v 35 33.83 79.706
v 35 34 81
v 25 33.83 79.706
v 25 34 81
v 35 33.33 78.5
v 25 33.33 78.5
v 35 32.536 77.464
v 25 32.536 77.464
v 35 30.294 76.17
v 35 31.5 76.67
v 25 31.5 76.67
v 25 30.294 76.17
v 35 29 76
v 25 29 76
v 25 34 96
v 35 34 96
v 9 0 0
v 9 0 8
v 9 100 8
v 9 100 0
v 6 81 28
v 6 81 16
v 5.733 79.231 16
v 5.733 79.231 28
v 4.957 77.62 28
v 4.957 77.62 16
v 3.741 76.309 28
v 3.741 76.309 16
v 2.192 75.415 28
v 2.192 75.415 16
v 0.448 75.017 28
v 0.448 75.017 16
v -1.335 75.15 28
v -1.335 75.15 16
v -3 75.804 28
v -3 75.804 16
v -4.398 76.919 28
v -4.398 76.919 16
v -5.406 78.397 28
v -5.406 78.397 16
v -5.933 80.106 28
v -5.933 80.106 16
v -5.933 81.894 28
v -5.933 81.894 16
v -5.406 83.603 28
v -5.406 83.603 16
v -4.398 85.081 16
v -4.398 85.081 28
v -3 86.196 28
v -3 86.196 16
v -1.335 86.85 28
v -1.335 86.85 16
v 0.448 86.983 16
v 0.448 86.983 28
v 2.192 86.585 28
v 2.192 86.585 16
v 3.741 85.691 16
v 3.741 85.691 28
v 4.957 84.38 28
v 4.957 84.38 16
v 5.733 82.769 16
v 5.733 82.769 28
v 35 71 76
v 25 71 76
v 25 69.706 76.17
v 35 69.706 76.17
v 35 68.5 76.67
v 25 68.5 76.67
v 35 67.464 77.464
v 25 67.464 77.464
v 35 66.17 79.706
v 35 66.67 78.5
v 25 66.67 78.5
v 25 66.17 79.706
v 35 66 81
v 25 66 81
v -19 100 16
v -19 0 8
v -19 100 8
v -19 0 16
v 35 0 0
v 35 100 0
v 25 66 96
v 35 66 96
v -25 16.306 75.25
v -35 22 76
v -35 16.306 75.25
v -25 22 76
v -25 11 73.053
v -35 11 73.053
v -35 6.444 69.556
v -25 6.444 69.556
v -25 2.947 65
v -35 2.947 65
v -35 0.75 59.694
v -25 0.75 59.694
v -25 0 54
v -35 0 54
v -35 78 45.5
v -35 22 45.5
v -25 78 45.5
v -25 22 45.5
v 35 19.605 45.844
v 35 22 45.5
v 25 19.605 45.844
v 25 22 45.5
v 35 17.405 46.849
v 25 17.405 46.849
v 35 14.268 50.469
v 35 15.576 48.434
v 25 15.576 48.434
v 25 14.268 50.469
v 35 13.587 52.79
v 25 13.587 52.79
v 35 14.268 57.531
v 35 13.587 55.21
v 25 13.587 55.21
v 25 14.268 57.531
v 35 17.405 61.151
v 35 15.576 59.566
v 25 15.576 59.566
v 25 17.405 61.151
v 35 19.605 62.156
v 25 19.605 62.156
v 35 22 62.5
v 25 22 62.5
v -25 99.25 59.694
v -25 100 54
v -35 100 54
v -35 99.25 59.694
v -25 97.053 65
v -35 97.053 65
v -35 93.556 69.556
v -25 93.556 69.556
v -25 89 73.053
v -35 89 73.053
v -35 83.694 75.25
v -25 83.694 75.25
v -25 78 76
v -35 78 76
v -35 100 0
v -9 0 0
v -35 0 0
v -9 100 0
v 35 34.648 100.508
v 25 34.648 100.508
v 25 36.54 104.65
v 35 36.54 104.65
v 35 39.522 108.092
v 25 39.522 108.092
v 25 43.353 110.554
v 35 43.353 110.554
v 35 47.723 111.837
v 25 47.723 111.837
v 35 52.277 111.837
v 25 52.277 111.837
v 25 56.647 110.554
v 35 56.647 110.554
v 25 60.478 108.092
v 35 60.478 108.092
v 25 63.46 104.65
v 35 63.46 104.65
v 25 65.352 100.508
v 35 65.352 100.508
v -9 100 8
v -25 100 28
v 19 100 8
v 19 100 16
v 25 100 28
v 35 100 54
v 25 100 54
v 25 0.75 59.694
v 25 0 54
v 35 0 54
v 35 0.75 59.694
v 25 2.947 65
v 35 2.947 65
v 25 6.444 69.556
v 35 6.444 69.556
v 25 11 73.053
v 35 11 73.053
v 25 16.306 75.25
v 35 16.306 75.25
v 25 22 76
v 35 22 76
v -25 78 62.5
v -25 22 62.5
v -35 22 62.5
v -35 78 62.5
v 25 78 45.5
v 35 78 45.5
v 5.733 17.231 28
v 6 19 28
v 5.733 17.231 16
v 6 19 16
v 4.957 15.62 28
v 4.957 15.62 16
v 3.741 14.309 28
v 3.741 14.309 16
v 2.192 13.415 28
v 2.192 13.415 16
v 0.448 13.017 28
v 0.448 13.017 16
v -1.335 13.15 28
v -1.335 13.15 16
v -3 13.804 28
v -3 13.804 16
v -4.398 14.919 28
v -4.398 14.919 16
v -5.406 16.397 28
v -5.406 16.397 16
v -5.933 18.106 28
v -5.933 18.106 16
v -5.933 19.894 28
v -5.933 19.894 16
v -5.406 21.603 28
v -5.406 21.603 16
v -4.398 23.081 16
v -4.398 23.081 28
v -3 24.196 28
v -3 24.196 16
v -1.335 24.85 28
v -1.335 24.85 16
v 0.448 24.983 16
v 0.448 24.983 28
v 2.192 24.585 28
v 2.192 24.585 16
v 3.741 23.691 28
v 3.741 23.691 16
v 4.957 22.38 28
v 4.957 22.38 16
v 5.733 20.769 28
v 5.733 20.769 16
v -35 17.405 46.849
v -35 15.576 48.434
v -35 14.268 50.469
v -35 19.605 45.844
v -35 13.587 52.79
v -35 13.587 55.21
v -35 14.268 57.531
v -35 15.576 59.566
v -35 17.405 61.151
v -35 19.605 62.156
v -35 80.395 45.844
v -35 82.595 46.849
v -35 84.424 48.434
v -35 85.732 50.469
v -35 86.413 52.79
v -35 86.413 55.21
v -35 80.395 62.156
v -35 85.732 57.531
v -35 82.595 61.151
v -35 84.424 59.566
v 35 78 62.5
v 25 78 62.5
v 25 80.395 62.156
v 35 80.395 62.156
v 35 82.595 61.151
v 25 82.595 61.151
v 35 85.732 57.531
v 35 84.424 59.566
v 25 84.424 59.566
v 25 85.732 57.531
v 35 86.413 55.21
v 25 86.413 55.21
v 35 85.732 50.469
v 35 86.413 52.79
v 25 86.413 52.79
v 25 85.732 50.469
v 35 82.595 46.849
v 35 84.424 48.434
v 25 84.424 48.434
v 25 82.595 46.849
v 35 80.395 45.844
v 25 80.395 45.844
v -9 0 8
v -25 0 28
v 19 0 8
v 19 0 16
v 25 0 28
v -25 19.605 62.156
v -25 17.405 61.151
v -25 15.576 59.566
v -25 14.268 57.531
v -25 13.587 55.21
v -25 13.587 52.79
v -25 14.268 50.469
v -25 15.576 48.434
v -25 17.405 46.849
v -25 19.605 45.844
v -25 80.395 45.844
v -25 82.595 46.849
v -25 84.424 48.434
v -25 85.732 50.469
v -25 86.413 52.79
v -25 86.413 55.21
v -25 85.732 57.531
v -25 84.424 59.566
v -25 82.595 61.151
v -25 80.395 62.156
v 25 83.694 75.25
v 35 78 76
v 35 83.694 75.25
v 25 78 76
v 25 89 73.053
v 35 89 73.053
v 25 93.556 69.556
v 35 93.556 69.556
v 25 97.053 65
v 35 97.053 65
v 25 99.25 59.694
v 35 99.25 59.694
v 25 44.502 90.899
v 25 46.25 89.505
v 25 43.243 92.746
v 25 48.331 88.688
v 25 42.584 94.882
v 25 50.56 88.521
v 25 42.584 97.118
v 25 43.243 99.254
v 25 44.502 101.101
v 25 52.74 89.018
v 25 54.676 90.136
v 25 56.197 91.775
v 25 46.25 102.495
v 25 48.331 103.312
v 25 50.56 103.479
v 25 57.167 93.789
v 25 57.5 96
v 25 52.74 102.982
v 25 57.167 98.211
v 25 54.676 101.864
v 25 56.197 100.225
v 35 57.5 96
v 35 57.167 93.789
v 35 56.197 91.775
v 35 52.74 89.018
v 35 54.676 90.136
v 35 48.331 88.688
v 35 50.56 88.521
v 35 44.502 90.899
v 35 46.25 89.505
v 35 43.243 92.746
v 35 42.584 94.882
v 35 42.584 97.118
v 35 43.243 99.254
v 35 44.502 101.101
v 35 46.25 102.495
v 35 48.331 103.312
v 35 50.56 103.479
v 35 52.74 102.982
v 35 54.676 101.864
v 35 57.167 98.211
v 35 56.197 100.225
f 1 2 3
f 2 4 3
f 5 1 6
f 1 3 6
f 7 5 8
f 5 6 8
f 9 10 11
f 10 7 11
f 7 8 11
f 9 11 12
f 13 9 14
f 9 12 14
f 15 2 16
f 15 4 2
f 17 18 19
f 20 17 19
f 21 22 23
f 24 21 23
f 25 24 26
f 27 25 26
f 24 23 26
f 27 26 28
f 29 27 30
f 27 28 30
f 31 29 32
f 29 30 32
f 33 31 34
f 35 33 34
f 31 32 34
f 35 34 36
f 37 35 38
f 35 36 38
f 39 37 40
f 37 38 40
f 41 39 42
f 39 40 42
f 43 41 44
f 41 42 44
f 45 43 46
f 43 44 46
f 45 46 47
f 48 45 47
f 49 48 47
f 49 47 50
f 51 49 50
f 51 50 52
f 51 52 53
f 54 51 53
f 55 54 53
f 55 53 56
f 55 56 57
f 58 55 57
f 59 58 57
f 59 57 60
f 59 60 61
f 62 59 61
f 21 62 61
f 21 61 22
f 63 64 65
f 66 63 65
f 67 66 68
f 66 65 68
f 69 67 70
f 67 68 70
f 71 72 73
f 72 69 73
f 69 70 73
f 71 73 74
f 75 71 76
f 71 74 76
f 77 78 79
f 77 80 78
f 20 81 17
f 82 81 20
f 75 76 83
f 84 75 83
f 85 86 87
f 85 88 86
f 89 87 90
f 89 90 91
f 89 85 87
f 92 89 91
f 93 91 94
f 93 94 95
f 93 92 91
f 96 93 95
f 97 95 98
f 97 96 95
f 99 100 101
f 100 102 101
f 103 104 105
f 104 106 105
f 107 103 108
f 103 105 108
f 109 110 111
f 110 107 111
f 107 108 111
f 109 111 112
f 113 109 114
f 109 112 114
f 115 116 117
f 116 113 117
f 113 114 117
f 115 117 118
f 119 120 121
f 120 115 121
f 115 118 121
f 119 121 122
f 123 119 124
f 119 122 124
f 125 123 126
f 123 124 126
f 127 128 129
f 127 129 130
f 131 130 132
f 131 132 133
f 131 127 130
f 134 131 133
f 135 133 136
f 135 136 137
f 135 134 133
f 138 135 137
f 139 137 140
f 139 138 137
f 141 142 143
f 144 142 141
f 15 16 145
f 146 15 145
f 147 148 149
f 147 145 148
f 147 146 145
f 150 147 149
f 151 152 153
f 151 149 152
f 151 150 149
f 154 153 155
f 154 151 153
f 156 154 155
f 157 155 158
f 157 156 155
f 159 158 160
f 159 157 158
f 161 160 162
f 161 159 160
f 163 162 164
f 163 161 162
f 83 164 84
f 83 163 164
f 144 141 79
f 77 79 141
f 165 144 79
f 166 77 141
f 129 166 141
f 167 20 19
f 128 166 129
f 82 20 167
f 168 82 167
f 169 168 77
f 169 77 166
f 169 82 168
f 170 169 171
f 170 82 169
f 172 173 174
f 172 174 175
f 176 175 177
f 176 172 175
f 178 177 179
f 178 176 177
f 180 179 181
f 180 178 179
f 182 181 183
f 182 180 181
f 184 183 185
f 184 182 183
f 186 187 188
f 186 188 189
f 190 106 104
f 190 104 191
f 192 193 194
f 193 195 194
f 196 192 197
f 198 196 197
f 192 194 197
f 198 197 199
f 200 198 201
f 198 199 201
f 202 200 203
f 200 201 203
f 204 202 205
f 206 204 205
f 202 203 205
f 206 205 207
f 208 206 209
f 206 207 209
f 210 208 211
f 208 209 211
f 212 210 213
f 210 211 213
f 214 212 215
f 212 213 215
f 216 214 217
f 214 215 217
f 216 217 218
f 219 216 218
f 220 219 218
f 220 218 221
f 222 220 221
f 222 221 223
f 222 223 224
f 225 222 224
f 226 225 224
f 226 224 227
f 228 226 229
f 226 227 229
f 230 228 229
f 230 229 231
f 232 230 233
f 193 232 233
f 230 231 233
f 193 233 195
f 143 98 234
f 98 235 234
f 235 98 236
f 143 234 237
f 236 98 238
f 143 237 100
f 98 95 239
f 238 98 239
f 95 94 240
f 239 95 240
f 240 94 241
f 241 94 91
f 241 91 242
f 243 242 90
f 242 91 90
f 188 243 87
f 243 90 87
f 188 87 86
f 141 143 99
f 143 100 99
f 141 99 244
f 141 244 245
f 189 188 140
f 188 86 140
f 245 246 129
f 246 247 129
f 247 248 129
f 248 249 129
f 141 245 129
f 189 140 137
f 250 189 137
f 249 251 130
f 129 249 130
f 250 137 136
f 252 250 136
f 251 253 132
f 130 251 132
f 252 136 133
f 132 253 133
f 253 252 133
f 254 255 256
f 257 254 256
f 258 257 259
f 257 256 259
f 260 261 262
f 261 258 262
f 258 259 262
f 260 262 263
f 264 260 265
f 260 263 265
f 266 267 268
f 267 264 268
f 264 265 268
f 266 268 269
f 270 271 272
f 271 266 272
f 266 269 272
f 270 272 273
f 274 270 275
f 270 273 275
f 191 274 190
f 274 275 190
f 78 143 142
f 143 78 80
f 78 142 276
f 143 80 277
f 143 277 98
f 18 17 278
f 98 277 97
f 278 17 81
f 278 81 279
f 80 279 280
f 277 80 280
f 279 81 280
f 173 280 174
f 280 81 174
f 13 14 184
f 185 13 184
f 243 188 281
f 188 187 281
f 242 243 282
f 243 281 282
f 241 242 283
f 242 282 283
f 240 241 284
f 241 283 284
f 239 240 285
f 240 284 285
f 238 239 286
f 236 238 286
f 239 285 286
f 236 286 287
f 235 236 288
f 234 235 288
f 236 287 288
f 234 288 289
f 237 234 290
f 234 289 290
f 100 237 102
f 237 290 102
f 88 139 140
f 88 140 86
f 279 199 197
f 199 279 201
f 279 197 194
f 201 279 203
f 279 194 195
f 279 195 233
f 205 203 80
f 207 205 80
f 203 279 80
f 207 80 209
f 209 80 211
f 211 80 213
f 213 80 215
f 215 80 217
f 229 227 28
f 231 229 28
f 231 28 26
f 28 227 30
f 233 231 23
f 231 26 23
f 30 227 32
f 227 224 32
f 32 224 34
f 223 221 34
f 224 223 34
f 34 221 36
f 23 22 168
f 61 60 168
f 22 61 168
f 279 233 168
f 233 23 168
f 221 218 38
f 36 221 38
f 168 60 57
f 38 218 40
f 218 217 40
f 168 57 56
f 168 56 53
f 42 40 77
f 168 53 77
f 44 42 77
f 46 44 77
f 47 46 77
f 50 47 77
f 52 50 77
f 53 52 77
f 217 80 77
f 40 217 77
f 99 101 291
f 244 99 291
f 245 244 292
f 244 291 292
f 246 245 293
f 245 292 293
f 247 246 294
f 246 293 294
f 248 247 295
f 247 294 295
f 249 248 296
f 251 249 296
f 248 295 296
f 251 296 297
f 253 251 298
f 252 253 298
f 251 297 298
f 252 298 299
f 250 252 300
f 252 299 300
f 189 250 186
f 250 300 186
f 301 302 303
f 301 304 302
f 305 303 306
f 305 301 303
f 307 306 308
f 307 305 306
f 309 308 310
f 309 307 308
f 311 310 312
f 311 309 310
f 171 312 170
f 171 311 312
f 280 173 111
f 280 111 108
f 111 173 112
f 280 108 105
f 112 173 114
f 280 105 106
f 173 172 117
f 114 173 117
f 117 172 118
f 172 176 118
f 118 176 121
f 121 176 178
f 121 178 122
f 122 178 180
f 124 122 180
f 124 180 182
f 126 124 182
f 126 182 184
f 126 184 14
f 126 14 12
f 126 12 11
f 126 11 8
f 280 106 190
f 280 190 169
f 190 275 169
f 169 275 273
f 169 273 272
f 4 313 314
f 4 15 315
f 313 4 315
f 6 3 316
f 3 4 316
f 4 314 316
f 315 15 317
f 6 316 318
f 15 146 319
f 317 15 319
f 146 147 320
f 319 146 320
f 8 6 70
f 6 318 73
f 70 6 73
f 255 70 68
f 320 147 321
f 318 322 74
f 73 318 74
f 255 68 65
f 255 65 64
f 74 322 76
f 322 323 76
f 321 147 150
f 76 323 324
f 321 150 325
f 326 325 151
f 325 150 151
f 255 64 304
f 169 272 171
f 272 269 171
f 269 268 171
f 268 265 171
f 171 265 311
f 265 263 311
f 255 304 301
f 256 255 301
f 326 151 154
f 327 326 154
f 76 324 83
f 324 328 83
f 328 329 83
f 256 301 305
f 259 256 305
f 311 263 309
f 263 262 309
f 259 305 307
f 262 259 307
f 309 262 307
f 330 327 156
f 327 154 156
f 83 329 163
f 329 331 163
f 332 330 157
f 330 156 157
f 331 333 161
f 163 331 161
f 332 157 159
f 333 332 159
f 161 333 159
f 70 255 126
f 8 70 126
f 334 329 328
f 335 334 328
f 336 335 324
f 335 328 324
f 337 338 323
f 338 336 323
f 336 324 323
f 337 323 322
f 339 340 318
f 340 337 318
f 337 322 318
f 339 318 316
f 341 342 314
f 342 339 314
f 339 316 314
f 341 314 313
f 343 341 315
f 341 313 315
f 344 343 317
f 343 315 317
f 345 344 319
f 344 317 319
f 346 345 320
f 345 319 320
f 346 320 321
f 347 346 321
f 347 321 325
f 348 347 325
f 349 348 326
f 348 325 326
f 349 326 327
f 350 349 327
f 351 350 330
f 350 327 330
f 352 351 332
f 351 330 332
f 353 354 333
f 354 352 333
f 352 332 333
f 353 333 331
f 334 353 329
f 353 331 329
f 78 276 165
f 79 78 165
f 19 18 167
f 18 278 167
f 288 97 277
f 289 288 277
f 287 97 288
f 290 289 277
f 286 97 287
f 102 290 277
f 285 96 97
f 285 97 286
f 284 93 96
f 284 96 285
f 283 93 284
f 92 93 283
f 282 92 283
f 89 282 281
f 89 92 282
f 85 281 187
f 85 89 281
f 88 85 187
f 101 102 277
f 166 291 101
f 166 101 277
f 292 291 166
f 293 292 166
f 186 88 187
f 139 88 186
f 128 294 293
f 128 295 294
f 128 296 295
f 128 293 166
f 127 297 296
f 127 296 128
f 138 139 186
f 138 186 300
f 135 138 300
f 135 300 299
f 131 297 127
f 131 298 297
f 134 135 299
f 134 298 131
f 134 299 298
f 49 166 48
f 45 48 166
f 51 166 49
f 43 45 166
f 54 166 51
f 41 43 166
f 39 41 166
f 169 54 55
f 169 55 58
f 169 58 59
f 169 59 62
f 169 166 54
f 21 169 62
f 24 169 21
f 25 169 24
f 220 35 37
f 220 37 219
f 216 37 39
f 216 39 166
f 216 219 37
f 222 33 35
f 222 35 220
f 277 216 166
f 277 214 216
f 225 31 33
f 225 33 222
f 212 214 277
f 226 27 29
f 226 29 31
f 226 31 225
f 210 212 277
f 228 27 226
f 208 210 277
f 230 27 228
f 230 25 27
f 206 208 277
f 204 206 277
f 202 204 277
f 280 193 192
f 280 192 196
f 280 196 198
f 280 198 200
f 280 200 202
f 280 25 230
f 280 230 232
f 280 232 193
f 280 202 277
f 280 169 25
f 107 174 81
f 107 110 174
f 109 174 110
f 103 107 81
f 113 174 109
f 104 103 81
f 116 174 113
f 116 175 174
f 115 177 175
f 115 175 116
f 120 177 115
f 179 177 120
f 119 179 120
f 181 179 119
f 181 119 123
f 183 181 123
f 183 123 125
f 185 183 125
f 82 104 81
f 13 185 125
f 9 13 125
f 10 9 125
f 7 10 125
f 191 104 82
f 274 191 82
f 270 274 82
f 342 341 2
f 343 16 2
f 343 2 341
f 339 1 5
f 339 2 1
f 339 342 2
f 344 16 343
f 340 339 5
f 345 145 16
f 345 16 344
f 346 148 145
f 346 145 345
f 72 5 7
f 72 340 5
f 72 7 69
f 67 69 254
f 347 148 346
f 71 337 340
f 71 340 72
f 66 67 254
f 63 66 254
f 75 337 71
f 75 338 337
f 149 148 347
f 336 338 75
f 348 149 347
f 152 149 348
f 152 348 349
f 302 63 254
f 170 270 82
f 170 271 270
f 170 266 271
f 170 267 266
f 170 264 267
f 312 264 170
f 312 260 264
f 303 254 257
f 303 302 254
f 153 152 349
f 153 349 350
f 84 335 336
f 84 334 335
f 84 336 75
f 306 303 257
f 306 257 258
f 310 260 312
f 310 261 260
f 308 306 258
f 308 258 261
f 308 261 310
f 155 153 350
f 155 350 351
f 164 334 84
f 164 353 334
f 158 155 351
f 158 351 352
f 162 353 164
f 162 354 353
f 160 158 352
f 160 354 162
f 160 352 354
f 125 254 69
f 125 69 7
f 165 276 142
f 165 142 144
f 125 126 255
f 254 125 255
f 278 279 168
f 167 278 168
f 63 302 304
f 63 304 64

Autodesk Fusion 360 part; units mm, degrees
sketch "Sketch1" plane through (0, 0, 0) normal (1, 0, 0) x (0, 1, 0)
  line L0 (0, 0) -> (100, 0)
  line L1 (100, 0) -> (100, 76) construction
  line L2 (0, 76) -> (0, 0) construction
  line L3 (0, 76) -> (100, 76) construction
  arc A0 (22, 76) -> (0, 54) centre (22, 54) ccw
  arc A1 (100, 54) -> (78, 76) centre (78, 54) ccw
  line L4 (22, 45.5) -> (78, 45.5)
  line L5 (22, 62.5) -> (78, 62.5)
  arc A2 (22, 62.5) -> (22, 45.5) centre (22, 54) ccw
  arc A3 (78, 45.5) -> (78, 62.5) centre (78, 54) ccw
  circle A4 centre (50, 96) radius 7.5
  line L6 (34, 81) -> (34, 96)
  line L7 (66, 81) -> (66, 96)
  arc A5 (29, 76) -> (34, 81) centre (29, 81) ccw
  arc A6 (66, 81) -> (71, 76) centre (71, 81) ccw
  line L8 (0, 0) -> (0, 54)
  line L9 (100, 0) -> (100, 54)
  line L10 (78, 76) -> (22, 76)
  arc A7 (66, 96) -> (34, 96) centre (50, 96) ccw
  line L11 (0, 8) -> (100, 8)
  line L12 (0, 16) -> (100, 16)
  line L13 (100, 28) -> (0, 28)
  dimension "d1" = 100
  dimension "d3" = 76
  dimension "d4" = 44
  dimension "d5" = 44
  dimension "d6" = 17
  dimension "d7" = 22
  dimension "d8" = 17
  dimension "d9" = 78
  dimension "d10" = 54
  dimension "d11" = 54
  dimension "d12" = 15
  dimension "d13" = 32
  dimension "d14" = 50
  dimension "d15" = 50
  dimension "d16" = 96
  dimension "d17" = 96
  dimension "d18" = 10
  dimension "d19" = 10
  dimension "d20" = 8
  dimension "d21" = 16
  dimension "d26" = 28
sketch "Sketch2" plane through (0, 0, 0) normal (0, 0, 1) x (1, 0, 0)
  line L0 (0, 0) -> (0, 81) construction
  circle A0 centre (0, 19) radius 6
  circle A1 centre (0, 81) radius 6
  dimension "d39" = 12
  dimension "d40" = 12
  dimension "d41" = 81
  dimension "d42" = 19
  dimension "d44" = 81
extrude "Extrude1" add sketch "Sketch1" along normal blind 10 from surface at 25 contours A0 A1 L8 L9 L10 L13 | L6 L7 A5 A6 L10 A7 makes body 1
extrude "Extrude2" add sketch "Sketch1" against normal blind 10 from surface at -25 separate body contours A0 A1 L8 L9 L10 L13 makes body 2
extrude "Extrude8" add sketch "Sketch1" along normal up to surface (-35 mm away) and the other way up to surface (-35 mm away) contours L8 L9 L12 L13 bodies 1 2
extrude "Extrude9" add sketch "Sketch1" along normal up to surface (35 mm away) and the other way up to surface (35 mm away) contours L8 L9 L11 L12 bodies 1
extrude "Extrude10" cut sketch "Sketch1" along normal blind 19 and the other way blind 19 contours L8 L9 L11 L12 bodies 1
extrude "Extrude11" add sketch "Sketch1" along normal up to surface (-35 mm away) and the other way up to surface (-35 mm away) contours L0 L8 L9 L11 bodies 1
extrude "Extrude12" cut sketch "Sketch1" along normal blind 9 and the other way blind 9 contours L0 L8 L9 L11 bodies 1
extrude "Extrude13" cut sketch "Sketch2" along normal through all bodies 1
equation "d3 = 54 mm + 22 mm"
equation "d6 = ( 8.5 * 2 ) * 1 mm"
equation "d7 = ( 100 mm / 2 mm ) * 1 mm - ( 56 / 2 ) * 1 mm"
equation "d9 = 100 mm - 22 mm"
equation "d11 = d10"
equation "d16 = d10 + 42 mm"
equation "d17 = d16"
equation "d41 = 100 mm - 19 mm"
equation "d44 = d41"
equation "d45 = 35 mm - 10 mm"
equation "d46 = -35 mm + 10 mm"
